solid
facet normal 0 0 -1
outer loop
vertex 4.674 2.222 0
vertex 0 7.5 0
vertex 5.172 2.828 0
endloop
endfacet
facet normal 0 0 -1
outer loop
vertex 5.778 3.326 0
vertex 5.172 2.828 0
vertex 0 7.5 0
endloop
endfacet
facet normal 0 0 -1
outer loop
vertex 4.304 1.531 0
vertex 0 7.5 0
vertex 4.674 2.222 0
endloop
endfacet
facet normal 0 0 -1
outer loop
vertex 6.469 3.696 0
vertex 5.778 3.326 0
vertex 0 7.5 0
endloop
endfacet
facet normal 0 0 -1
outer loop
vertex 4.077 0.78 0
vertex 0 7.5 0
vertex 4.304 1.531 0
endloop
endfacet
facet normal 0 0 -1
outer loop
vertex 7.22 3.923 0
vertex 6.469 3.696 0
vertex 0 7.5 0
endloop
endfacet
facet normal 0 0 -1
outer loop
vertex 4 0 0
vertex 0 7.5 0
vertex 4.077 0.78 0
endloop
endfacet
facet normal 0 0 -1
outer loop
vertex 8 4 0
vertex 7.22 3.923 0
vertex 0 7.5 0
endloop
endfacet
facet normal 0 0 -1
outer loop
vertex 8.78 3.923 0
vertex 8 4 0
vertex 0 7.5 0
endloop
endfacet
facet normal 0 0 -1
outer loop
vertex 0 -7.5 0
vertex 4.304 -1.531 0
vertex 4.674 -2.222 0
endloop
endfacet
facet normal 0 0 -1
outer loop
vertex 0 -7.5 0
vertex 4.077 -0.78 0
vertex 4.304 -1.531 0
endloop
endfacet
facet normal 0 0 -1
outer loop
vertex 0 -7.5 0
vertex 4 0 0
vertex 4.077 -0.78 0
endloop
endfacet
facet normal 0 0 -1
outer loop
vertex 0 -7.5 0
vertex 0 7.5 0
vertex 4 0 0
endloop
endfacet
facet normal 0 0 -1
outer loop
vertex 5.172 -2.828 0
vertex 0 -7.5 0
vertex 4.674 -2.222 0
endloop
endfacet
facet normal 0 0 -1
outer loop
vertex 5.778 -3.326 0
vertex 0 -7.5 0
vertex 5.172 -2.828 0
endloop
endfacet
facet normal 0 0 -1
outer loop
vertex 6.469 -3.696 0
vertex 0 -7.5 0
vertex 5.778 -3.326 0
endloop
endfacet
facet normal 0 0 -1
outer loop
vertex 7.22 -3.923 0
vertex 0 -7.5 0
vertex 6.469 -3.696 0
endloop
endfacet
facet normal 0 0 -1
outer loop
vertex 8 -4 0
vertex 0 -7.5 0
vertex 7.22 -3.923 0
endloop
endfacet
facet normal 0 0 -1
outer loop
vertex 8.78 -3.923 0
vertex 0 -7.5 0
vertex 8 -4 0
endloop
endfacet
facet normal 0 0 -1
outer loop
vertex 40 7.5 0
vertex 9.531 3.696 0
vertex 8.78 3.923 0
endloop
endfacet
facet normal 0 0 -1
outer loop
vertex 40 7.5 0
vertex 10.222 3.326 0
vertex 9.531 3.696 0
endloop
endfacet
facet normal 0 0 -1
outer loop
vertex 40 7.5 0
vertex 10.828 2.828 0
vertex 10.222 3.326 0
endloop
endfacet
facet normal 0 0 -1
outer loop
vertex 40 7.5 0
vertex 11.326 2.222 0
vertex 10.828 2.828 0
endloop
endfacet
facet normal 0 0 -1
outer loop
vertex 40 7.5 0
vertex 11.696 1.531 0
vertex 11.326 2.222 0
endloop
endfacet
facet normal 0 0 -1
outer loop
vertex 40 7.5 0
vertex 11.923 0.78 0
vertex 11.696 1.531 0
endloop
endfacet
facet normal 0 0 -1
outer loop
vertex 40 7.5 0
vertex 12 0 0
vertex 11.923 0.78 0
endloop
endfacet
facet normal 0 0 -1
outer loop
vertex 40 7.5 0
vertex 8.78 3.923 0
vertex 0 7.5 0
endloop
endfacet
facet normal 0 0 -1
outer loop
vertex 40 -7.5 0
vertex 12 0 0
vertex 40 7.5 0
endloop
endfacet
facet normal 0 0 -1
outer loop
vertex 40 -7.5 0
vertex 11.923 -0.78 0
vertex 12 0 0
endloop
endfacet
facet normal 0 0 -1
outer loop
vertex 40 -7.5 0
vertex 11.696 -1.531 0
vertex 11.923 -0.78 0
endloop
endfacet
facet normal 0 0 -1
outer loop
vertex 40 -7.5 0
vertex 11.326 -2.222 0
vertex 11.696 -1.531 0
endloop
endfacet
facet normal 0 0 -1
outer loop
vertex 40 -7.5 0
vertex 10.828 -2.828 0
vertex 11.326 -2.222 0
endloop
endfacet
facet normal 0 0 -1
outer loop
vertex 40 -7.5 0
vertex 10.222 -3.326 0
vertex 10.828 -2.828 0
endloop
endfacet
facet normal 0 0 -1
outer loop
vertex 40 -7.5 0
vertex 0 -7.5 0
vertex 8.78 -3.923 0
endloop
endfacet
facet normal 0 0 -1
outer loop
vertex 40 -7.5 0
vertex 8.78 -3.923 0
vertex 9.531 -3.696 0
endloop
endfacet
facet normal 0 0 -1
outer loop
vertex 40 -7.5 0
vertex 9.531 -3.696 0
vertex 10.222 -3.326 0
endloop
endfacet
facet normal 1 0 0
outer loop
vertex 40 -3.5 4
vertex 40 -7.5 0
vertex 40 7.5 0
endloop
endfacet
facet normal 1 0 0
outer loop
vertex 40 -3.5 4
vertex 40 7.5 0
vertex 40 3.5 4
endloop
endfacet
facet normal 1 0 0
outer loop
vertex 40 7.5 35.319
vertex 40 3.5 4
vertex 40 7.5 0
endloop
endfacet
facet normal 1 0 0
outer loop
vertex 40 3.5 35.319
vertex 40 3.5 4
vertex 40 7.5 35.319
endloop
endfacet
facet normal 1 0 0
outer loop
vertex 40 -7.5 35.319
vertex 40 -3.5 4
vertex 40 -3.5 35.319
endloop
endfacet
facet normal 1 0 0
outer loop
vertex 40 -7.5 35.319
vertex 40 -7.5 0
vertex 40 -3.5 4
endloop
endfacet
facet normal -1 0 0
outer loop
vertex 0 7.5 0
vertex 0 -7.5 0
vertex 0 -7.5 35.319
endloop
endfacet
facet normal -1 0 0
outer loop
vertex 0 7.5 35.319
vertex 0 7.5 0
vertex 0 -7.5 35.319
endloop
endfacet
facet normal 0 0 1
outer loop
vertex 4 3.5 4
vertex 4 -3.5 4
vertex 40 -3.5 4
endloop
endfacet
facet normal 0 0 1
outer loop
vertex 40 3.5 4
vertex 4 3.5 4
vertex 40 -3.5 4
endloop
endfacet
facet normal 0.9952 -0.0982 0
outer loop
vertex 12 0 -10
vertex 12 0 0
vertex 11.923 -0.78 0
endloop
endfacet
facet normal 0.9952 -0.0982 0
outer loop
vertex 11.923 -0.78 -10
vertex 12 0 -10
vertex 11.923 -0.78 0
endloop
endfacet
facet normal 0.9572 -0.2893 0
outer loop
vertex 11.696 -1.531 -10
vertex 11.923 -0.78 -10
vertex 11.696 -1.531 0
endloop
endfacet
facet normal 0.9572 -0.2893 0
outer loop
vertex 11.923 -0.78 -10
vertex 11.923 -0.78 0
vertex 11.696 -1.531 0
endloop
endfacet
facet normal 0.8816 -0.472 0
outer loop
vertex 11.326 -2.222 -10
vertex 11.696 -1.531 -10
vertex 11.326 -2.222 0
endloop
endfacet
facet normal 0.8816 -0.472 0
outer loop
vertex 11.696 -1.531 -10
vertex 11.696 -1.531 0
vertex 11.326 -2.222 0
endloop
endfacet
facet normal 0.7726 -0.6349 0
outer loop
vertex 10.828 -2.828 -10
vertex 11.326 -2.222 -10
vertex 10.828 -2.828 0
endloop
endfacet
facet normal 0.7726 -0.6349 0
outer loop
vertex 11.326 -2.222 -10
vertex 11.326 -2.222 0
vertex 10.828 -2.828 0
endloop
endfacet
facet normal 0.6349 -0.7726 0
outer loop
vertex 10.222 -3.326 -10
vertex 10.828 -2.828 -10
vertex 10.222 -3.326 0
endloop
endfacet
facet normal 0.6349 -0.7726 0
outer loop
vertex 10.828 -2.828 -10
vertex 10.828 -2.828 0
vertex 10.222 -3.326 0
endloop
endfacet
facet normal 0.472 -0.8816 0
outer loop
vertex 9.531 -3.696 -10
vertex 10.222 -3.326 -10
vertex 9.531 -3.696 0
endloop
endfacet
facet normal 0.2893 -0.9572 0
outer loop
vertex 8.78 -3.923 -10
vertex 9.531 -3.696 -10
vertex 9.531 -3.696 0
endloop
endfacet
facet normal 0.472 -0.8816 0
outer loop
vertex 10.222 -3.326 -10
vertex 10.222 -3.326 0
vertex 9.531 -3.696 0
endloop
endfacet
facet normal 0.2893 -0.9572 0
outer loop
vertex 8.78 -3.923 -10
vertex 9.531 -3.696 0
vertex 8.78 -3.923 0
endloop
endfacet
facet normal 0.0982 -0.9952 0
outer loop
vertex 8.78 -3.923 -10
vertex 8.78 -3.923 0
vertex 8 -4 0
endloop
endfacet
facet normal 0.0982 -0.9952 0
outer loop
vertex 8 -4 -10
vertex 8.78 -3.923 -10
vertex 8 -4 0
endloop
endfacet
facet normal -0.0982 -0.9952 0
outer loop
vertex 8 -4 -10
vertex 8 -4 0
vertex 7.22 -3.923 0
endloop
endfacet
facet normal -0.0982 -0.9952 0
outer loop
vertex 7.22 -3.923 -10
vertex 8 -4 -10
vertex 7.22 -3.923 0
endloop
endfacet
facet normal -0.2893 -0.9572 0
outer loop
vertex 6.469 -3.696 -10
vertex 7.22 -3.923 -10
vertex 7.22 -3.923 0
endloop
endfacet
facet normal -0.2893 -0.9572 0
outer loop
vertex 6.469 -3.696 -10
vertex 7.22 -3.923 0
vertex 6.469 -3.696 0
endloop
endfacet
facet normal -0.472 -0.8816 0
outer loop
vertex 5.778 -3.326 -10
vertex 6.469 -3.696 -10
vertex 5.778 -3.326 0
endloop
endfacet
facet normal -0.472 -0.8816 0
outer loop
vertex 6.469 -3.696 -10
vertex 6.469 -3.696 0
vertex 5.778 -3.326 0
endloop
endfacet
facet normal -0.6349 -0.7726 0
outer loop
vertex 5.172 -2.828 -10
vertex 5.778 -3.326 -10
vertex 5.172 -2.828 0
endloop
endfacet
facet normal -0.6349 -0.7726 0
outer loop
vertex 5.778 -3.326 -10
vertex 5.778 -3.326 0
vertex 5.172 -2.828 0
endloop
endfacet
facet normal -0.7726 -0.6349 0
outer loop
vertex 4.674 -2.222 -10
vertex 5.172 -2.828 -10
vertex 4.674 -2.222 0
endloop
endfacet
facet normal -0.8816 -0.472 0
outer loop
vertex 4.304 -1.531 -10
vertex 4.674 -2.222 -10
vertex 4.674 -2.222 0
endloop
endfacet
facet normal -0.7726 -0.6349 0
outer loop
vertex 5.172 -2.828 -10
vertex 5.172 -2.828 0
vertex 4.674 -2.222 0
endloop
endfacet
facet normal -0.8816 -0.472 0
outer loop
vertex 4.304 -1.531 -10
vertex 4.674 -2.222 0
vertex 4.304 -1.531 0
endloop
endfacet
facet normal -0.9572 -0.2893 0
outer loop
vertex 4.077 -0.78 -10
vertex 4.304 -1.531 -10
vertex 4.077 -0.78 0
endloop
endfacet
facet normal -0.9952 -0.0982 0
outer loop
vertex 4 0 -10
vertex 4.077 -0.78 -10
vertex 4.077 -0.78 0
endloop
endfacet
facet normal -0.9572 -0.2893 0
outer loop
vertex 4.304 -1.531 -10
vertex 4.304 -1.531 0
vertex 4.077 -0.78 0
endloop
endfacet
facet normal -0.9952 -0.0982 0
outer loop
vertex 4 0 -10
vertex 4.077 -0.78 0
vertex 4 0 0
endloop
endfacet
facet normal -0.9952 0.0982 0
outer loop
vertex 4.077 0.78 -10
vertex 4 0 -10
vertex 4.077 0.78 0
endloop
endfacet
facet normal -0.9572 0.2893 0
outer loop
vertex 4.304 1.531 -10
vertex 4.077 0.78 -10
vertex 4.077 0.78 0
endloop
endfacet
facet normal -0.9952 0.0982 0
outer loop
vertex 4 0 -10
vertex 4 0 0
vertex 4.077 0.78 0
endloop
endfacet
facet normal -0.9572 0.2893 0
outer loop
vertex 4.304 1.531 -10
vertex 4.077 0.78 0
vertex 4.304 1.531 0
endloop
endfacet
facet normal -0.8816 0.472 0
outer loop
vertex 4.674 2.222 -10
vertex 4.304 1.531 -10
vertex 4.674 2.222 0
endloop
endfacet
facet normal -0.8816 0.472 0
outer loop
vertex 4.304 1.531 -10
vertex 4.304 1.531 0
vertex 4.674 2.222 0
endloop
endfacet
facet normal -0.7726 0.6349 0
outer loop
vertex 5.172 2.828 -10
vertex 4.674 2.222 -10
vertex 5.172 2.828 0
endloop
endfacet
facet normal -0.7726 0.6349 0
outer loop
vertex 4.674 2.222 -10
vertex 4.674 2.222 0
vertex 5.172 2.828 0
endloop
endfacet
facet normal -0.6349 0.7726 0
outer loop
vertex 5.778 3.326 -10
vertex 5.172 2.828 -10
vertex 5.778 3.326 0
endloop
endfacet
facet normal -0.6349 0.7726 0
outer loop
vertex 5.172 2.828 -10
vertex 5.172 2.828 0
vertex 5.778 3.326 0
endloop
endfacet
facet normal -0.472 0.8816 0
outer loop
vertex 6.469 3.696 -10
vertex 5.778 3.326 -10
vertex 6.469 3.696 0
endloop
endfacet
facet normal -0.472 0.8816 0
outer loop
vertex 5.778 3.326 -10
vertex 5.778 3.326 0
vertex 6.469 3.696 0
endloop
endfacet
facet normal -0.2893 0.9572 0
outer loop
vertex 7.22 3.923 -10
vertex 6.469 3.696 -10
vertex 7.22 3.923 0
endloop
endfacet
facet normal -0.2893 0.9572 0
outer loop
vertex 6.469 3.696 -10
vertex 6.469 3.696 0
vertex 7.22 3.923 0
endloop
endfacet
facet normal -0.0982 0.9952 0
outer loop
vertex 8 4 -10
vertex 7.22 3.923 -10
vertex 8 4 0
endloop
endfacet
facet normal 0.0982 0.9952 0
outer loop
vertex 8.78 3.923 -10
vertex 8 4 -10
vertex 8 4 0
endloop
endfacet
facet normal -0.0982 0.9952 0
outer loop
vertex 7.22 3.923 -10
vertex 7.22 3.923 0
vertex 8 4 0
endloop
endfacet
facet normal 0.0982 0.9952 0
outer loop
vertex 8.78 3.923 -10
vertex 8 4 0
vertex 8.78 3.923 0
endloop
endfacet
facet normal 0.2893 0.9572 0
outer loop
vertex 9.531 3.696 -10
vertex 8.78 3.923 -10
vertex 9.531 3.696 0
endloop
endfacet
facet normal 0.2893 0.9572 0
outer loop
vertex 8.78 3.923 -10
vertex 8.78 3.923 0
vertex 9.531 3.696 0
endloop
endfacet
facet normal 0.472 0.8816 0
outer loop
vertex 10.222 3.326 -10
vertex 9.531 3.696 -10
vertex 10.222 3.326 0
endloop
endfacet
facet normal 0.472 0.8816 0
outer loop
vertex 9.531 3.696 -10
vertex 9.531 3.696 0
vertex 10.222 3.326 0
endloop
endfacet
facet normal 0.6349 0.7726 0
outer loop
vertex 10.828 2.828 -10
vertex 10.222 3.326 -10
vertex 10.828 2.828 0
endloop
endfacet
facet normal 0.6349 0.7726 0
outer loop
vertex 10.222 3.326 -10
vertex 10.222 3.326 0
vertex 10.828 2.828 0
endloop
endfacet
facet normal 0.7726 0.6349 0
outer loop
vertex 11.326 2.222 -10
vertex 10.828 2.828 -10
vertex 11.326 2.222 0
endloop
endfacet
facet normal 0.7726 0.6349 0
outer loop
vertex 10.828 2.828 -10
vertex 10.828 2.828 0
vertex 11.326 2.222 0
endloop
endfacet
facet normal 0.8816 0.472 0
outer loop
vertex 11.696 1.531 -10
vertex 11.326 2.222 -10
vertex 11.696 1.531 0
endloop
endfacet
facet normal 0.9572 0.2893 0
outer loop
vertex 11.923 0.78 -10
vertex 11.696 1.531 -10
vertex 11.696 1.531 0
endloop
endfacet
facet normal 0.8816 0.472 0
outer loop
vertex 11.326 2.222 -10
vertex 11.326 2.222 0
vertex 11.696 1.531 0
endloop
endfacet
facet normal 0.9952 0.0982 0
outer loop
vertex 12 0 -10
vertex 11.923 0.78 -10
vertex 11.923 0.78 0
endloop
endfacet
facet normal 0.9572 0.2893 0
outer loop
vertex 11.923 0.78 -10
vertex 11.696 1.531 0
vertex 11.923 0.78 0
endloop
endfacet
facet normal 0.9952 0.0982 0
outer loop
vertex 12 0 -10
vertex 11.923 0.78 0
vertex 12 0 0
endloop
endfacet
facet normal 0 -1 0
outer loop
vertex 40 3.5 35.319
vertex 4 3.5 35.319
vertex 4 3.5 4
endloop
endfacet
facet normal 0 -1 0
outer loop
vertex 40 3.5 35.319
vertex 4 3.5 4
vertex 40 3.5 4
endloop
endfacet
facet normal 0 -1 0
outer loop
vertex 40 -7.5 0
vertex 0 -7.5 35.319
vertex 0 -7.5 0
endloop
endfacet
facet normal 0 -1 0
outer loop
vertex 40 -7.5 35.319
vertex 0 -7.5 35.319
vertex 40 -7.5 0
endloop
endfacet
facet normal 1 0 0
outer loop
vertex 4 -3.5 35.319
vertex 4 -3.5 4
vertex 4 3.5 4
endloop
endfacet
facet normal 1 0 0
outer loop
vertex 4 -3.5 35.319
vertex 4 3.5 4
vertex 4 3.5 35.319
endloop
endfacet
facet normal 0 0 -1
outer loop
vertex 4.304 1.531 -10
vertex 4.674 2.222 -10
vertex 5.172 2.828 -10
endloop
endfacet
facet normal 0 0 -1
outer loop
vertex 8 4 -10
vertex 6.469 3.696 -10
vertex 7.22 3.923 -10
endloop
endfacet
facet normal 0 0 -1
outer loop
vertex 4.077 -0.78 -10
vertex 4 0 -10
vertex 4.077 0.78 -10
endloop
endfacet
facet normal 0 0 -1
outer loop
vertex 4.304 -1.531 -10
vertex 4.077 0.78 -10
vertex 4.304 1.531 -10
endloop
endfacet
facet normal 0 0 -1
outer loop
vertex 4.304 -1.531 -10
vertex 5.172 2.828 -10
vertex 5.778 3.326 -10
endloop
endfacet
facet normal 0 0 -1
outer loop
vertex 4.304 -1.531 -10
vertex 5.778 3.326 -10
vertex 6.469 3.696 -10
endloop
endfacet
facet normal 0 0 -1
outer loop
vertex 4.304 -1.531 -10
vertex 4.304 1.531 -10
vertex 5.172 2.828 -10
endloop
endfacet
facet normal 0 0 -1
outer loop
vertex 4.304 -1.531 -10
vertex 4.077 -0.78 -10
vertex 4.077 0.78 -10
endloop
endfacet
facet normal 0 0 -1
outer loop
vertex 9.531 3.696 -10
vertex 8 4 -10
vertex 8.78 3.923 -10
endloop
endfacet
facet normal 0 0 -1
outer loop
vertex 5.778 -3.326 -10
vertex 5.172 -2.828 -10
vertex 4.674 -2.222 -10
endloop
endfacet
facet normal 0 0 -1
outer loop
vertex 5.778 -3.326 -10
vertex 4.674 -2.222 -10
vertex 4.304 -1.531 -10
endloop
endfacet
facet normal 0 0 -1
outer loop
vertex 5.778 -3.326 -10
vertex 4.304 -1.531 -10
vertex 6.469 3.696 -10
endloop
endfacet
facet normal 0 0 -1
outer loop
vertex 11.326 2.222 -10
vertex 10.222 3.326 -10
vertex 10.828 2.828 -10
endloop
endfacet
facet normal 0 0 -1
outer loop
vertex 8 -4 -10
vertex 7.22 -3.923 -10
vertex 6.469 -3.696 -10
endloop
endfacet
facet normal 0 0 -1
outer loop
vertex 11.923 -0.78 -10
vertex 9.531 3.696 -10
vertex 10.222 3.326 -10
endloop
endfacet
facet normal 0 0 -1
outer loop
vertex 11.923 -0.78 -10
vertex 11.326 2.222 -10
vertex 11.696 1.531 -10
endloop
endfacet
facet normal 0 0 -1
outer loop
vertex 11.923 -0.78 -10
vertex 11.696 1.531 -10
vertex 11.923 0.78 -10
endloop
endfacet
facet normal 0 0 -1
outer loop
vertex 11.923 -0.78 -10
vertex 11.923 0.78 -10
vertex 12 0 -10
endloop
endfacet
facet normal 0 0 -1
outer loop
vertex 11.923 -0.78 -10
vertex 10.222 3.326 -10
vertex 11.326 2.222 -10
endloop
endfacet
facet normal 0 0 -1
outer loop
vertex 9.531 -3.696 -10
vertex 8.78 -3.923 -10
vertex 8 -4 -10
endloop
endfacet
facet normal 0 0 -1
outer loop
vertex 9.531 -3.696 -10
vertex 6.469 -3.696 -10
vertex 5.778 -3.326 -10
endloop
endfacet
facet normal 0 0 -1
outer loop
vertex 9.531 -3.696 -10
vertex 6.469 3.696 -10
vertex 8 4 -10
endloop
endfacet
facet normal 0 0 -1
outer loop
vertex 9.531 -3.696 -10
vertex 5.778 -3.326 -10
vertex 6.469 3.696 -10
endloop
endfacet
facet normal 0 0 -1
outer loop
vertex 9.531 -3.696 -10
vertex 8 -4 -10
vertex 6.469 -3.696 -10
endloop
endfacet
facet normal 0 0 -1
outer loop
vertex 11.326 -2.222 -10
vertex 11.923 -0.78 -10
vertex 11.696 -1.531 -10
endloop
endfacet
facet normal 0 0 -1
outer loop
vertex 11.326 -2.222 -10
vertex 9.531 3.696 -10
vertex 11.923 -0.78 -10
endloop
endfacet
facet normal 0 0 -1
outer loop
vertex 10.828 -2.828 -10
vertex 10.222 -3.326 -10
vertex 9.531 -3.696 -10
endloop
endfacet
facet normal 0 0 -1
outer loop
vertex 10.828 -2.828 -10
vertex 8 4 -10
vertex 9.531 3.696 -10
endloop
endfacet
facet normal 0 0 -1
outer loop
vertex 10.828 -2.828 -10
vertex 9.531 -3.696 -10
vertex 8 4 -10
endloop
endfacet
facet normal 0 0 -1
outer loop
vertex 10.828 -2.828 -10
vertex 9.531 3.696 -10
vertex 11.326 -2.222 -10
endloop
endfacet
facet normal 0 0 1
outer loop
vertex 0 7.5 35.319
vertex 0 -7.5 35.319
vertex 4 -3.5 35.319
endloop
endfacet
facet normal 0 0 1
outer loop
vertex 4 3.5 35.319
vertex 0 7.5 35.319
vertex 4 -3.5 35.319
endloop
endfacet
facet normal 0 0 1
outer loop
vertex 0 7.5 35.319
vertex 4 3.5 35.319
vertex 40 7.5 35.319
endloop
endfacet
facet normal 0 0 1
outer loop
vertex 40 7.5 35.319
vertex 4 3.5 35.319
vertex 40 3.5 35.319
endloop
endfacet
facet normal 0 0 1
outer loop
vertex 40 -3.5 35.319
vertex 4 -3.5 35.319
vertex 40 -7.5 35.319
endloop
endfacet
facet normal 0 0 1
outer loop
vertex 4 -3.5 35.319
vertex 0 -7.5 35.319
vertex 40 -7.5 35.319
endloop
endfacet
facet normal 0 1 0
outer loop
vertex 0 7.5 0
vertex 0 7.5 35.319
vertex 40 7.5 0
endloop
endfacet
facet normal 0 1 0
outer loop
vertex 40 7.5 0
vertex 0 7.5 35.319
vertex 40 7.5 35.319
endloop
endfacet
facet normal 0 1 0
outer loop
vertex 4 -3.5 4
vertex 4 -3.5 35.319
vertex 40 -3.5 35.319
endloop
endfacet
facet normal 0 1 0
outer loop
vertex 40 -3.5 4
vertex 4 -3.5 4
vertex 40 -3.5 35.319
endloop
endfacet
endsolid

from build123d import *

# Parameters (mm, degrees)
F0_W     = 40
F0_H     = 35.319249
F1_DEPTH = 7.5
F2_W     = 36
F2_H     = 31.319249
F3_DEPTH = 3.5
F4_R     = 4
F5_DEPTH = 10


with BuildPart() as f1:
    # F0 (on Front) → F1 (new body, symmetric)
    with BuildSketch(Plane.XZ):
        with Locations((20, 17.659624)):
            Rectangle(F0_W, F0_H)
    extrude(amount=F1_DEPTH, both=True)

    # F2 (on Front) → F3 (cut, symmetric)
    with BuildSketch(Plane.XZ):
        with Locations((22, 19.659624)):
            Rectangle(F2_W, F2_H)
    extrude(amount=F3_DEPTH, both=True, mode=Mode.SUBTRACT)

    # F4 (on face) → F5 (join)
    with BuildSketch(Plane(origin=(0, 0, 0), x_dir=(1, 0, 0), z_dir=(0, 0, -1))):
        with Locations((8, 0)):
            Circle(F4_R)
    extrude(amount=F5_DEPTH)


solid = f1.part
